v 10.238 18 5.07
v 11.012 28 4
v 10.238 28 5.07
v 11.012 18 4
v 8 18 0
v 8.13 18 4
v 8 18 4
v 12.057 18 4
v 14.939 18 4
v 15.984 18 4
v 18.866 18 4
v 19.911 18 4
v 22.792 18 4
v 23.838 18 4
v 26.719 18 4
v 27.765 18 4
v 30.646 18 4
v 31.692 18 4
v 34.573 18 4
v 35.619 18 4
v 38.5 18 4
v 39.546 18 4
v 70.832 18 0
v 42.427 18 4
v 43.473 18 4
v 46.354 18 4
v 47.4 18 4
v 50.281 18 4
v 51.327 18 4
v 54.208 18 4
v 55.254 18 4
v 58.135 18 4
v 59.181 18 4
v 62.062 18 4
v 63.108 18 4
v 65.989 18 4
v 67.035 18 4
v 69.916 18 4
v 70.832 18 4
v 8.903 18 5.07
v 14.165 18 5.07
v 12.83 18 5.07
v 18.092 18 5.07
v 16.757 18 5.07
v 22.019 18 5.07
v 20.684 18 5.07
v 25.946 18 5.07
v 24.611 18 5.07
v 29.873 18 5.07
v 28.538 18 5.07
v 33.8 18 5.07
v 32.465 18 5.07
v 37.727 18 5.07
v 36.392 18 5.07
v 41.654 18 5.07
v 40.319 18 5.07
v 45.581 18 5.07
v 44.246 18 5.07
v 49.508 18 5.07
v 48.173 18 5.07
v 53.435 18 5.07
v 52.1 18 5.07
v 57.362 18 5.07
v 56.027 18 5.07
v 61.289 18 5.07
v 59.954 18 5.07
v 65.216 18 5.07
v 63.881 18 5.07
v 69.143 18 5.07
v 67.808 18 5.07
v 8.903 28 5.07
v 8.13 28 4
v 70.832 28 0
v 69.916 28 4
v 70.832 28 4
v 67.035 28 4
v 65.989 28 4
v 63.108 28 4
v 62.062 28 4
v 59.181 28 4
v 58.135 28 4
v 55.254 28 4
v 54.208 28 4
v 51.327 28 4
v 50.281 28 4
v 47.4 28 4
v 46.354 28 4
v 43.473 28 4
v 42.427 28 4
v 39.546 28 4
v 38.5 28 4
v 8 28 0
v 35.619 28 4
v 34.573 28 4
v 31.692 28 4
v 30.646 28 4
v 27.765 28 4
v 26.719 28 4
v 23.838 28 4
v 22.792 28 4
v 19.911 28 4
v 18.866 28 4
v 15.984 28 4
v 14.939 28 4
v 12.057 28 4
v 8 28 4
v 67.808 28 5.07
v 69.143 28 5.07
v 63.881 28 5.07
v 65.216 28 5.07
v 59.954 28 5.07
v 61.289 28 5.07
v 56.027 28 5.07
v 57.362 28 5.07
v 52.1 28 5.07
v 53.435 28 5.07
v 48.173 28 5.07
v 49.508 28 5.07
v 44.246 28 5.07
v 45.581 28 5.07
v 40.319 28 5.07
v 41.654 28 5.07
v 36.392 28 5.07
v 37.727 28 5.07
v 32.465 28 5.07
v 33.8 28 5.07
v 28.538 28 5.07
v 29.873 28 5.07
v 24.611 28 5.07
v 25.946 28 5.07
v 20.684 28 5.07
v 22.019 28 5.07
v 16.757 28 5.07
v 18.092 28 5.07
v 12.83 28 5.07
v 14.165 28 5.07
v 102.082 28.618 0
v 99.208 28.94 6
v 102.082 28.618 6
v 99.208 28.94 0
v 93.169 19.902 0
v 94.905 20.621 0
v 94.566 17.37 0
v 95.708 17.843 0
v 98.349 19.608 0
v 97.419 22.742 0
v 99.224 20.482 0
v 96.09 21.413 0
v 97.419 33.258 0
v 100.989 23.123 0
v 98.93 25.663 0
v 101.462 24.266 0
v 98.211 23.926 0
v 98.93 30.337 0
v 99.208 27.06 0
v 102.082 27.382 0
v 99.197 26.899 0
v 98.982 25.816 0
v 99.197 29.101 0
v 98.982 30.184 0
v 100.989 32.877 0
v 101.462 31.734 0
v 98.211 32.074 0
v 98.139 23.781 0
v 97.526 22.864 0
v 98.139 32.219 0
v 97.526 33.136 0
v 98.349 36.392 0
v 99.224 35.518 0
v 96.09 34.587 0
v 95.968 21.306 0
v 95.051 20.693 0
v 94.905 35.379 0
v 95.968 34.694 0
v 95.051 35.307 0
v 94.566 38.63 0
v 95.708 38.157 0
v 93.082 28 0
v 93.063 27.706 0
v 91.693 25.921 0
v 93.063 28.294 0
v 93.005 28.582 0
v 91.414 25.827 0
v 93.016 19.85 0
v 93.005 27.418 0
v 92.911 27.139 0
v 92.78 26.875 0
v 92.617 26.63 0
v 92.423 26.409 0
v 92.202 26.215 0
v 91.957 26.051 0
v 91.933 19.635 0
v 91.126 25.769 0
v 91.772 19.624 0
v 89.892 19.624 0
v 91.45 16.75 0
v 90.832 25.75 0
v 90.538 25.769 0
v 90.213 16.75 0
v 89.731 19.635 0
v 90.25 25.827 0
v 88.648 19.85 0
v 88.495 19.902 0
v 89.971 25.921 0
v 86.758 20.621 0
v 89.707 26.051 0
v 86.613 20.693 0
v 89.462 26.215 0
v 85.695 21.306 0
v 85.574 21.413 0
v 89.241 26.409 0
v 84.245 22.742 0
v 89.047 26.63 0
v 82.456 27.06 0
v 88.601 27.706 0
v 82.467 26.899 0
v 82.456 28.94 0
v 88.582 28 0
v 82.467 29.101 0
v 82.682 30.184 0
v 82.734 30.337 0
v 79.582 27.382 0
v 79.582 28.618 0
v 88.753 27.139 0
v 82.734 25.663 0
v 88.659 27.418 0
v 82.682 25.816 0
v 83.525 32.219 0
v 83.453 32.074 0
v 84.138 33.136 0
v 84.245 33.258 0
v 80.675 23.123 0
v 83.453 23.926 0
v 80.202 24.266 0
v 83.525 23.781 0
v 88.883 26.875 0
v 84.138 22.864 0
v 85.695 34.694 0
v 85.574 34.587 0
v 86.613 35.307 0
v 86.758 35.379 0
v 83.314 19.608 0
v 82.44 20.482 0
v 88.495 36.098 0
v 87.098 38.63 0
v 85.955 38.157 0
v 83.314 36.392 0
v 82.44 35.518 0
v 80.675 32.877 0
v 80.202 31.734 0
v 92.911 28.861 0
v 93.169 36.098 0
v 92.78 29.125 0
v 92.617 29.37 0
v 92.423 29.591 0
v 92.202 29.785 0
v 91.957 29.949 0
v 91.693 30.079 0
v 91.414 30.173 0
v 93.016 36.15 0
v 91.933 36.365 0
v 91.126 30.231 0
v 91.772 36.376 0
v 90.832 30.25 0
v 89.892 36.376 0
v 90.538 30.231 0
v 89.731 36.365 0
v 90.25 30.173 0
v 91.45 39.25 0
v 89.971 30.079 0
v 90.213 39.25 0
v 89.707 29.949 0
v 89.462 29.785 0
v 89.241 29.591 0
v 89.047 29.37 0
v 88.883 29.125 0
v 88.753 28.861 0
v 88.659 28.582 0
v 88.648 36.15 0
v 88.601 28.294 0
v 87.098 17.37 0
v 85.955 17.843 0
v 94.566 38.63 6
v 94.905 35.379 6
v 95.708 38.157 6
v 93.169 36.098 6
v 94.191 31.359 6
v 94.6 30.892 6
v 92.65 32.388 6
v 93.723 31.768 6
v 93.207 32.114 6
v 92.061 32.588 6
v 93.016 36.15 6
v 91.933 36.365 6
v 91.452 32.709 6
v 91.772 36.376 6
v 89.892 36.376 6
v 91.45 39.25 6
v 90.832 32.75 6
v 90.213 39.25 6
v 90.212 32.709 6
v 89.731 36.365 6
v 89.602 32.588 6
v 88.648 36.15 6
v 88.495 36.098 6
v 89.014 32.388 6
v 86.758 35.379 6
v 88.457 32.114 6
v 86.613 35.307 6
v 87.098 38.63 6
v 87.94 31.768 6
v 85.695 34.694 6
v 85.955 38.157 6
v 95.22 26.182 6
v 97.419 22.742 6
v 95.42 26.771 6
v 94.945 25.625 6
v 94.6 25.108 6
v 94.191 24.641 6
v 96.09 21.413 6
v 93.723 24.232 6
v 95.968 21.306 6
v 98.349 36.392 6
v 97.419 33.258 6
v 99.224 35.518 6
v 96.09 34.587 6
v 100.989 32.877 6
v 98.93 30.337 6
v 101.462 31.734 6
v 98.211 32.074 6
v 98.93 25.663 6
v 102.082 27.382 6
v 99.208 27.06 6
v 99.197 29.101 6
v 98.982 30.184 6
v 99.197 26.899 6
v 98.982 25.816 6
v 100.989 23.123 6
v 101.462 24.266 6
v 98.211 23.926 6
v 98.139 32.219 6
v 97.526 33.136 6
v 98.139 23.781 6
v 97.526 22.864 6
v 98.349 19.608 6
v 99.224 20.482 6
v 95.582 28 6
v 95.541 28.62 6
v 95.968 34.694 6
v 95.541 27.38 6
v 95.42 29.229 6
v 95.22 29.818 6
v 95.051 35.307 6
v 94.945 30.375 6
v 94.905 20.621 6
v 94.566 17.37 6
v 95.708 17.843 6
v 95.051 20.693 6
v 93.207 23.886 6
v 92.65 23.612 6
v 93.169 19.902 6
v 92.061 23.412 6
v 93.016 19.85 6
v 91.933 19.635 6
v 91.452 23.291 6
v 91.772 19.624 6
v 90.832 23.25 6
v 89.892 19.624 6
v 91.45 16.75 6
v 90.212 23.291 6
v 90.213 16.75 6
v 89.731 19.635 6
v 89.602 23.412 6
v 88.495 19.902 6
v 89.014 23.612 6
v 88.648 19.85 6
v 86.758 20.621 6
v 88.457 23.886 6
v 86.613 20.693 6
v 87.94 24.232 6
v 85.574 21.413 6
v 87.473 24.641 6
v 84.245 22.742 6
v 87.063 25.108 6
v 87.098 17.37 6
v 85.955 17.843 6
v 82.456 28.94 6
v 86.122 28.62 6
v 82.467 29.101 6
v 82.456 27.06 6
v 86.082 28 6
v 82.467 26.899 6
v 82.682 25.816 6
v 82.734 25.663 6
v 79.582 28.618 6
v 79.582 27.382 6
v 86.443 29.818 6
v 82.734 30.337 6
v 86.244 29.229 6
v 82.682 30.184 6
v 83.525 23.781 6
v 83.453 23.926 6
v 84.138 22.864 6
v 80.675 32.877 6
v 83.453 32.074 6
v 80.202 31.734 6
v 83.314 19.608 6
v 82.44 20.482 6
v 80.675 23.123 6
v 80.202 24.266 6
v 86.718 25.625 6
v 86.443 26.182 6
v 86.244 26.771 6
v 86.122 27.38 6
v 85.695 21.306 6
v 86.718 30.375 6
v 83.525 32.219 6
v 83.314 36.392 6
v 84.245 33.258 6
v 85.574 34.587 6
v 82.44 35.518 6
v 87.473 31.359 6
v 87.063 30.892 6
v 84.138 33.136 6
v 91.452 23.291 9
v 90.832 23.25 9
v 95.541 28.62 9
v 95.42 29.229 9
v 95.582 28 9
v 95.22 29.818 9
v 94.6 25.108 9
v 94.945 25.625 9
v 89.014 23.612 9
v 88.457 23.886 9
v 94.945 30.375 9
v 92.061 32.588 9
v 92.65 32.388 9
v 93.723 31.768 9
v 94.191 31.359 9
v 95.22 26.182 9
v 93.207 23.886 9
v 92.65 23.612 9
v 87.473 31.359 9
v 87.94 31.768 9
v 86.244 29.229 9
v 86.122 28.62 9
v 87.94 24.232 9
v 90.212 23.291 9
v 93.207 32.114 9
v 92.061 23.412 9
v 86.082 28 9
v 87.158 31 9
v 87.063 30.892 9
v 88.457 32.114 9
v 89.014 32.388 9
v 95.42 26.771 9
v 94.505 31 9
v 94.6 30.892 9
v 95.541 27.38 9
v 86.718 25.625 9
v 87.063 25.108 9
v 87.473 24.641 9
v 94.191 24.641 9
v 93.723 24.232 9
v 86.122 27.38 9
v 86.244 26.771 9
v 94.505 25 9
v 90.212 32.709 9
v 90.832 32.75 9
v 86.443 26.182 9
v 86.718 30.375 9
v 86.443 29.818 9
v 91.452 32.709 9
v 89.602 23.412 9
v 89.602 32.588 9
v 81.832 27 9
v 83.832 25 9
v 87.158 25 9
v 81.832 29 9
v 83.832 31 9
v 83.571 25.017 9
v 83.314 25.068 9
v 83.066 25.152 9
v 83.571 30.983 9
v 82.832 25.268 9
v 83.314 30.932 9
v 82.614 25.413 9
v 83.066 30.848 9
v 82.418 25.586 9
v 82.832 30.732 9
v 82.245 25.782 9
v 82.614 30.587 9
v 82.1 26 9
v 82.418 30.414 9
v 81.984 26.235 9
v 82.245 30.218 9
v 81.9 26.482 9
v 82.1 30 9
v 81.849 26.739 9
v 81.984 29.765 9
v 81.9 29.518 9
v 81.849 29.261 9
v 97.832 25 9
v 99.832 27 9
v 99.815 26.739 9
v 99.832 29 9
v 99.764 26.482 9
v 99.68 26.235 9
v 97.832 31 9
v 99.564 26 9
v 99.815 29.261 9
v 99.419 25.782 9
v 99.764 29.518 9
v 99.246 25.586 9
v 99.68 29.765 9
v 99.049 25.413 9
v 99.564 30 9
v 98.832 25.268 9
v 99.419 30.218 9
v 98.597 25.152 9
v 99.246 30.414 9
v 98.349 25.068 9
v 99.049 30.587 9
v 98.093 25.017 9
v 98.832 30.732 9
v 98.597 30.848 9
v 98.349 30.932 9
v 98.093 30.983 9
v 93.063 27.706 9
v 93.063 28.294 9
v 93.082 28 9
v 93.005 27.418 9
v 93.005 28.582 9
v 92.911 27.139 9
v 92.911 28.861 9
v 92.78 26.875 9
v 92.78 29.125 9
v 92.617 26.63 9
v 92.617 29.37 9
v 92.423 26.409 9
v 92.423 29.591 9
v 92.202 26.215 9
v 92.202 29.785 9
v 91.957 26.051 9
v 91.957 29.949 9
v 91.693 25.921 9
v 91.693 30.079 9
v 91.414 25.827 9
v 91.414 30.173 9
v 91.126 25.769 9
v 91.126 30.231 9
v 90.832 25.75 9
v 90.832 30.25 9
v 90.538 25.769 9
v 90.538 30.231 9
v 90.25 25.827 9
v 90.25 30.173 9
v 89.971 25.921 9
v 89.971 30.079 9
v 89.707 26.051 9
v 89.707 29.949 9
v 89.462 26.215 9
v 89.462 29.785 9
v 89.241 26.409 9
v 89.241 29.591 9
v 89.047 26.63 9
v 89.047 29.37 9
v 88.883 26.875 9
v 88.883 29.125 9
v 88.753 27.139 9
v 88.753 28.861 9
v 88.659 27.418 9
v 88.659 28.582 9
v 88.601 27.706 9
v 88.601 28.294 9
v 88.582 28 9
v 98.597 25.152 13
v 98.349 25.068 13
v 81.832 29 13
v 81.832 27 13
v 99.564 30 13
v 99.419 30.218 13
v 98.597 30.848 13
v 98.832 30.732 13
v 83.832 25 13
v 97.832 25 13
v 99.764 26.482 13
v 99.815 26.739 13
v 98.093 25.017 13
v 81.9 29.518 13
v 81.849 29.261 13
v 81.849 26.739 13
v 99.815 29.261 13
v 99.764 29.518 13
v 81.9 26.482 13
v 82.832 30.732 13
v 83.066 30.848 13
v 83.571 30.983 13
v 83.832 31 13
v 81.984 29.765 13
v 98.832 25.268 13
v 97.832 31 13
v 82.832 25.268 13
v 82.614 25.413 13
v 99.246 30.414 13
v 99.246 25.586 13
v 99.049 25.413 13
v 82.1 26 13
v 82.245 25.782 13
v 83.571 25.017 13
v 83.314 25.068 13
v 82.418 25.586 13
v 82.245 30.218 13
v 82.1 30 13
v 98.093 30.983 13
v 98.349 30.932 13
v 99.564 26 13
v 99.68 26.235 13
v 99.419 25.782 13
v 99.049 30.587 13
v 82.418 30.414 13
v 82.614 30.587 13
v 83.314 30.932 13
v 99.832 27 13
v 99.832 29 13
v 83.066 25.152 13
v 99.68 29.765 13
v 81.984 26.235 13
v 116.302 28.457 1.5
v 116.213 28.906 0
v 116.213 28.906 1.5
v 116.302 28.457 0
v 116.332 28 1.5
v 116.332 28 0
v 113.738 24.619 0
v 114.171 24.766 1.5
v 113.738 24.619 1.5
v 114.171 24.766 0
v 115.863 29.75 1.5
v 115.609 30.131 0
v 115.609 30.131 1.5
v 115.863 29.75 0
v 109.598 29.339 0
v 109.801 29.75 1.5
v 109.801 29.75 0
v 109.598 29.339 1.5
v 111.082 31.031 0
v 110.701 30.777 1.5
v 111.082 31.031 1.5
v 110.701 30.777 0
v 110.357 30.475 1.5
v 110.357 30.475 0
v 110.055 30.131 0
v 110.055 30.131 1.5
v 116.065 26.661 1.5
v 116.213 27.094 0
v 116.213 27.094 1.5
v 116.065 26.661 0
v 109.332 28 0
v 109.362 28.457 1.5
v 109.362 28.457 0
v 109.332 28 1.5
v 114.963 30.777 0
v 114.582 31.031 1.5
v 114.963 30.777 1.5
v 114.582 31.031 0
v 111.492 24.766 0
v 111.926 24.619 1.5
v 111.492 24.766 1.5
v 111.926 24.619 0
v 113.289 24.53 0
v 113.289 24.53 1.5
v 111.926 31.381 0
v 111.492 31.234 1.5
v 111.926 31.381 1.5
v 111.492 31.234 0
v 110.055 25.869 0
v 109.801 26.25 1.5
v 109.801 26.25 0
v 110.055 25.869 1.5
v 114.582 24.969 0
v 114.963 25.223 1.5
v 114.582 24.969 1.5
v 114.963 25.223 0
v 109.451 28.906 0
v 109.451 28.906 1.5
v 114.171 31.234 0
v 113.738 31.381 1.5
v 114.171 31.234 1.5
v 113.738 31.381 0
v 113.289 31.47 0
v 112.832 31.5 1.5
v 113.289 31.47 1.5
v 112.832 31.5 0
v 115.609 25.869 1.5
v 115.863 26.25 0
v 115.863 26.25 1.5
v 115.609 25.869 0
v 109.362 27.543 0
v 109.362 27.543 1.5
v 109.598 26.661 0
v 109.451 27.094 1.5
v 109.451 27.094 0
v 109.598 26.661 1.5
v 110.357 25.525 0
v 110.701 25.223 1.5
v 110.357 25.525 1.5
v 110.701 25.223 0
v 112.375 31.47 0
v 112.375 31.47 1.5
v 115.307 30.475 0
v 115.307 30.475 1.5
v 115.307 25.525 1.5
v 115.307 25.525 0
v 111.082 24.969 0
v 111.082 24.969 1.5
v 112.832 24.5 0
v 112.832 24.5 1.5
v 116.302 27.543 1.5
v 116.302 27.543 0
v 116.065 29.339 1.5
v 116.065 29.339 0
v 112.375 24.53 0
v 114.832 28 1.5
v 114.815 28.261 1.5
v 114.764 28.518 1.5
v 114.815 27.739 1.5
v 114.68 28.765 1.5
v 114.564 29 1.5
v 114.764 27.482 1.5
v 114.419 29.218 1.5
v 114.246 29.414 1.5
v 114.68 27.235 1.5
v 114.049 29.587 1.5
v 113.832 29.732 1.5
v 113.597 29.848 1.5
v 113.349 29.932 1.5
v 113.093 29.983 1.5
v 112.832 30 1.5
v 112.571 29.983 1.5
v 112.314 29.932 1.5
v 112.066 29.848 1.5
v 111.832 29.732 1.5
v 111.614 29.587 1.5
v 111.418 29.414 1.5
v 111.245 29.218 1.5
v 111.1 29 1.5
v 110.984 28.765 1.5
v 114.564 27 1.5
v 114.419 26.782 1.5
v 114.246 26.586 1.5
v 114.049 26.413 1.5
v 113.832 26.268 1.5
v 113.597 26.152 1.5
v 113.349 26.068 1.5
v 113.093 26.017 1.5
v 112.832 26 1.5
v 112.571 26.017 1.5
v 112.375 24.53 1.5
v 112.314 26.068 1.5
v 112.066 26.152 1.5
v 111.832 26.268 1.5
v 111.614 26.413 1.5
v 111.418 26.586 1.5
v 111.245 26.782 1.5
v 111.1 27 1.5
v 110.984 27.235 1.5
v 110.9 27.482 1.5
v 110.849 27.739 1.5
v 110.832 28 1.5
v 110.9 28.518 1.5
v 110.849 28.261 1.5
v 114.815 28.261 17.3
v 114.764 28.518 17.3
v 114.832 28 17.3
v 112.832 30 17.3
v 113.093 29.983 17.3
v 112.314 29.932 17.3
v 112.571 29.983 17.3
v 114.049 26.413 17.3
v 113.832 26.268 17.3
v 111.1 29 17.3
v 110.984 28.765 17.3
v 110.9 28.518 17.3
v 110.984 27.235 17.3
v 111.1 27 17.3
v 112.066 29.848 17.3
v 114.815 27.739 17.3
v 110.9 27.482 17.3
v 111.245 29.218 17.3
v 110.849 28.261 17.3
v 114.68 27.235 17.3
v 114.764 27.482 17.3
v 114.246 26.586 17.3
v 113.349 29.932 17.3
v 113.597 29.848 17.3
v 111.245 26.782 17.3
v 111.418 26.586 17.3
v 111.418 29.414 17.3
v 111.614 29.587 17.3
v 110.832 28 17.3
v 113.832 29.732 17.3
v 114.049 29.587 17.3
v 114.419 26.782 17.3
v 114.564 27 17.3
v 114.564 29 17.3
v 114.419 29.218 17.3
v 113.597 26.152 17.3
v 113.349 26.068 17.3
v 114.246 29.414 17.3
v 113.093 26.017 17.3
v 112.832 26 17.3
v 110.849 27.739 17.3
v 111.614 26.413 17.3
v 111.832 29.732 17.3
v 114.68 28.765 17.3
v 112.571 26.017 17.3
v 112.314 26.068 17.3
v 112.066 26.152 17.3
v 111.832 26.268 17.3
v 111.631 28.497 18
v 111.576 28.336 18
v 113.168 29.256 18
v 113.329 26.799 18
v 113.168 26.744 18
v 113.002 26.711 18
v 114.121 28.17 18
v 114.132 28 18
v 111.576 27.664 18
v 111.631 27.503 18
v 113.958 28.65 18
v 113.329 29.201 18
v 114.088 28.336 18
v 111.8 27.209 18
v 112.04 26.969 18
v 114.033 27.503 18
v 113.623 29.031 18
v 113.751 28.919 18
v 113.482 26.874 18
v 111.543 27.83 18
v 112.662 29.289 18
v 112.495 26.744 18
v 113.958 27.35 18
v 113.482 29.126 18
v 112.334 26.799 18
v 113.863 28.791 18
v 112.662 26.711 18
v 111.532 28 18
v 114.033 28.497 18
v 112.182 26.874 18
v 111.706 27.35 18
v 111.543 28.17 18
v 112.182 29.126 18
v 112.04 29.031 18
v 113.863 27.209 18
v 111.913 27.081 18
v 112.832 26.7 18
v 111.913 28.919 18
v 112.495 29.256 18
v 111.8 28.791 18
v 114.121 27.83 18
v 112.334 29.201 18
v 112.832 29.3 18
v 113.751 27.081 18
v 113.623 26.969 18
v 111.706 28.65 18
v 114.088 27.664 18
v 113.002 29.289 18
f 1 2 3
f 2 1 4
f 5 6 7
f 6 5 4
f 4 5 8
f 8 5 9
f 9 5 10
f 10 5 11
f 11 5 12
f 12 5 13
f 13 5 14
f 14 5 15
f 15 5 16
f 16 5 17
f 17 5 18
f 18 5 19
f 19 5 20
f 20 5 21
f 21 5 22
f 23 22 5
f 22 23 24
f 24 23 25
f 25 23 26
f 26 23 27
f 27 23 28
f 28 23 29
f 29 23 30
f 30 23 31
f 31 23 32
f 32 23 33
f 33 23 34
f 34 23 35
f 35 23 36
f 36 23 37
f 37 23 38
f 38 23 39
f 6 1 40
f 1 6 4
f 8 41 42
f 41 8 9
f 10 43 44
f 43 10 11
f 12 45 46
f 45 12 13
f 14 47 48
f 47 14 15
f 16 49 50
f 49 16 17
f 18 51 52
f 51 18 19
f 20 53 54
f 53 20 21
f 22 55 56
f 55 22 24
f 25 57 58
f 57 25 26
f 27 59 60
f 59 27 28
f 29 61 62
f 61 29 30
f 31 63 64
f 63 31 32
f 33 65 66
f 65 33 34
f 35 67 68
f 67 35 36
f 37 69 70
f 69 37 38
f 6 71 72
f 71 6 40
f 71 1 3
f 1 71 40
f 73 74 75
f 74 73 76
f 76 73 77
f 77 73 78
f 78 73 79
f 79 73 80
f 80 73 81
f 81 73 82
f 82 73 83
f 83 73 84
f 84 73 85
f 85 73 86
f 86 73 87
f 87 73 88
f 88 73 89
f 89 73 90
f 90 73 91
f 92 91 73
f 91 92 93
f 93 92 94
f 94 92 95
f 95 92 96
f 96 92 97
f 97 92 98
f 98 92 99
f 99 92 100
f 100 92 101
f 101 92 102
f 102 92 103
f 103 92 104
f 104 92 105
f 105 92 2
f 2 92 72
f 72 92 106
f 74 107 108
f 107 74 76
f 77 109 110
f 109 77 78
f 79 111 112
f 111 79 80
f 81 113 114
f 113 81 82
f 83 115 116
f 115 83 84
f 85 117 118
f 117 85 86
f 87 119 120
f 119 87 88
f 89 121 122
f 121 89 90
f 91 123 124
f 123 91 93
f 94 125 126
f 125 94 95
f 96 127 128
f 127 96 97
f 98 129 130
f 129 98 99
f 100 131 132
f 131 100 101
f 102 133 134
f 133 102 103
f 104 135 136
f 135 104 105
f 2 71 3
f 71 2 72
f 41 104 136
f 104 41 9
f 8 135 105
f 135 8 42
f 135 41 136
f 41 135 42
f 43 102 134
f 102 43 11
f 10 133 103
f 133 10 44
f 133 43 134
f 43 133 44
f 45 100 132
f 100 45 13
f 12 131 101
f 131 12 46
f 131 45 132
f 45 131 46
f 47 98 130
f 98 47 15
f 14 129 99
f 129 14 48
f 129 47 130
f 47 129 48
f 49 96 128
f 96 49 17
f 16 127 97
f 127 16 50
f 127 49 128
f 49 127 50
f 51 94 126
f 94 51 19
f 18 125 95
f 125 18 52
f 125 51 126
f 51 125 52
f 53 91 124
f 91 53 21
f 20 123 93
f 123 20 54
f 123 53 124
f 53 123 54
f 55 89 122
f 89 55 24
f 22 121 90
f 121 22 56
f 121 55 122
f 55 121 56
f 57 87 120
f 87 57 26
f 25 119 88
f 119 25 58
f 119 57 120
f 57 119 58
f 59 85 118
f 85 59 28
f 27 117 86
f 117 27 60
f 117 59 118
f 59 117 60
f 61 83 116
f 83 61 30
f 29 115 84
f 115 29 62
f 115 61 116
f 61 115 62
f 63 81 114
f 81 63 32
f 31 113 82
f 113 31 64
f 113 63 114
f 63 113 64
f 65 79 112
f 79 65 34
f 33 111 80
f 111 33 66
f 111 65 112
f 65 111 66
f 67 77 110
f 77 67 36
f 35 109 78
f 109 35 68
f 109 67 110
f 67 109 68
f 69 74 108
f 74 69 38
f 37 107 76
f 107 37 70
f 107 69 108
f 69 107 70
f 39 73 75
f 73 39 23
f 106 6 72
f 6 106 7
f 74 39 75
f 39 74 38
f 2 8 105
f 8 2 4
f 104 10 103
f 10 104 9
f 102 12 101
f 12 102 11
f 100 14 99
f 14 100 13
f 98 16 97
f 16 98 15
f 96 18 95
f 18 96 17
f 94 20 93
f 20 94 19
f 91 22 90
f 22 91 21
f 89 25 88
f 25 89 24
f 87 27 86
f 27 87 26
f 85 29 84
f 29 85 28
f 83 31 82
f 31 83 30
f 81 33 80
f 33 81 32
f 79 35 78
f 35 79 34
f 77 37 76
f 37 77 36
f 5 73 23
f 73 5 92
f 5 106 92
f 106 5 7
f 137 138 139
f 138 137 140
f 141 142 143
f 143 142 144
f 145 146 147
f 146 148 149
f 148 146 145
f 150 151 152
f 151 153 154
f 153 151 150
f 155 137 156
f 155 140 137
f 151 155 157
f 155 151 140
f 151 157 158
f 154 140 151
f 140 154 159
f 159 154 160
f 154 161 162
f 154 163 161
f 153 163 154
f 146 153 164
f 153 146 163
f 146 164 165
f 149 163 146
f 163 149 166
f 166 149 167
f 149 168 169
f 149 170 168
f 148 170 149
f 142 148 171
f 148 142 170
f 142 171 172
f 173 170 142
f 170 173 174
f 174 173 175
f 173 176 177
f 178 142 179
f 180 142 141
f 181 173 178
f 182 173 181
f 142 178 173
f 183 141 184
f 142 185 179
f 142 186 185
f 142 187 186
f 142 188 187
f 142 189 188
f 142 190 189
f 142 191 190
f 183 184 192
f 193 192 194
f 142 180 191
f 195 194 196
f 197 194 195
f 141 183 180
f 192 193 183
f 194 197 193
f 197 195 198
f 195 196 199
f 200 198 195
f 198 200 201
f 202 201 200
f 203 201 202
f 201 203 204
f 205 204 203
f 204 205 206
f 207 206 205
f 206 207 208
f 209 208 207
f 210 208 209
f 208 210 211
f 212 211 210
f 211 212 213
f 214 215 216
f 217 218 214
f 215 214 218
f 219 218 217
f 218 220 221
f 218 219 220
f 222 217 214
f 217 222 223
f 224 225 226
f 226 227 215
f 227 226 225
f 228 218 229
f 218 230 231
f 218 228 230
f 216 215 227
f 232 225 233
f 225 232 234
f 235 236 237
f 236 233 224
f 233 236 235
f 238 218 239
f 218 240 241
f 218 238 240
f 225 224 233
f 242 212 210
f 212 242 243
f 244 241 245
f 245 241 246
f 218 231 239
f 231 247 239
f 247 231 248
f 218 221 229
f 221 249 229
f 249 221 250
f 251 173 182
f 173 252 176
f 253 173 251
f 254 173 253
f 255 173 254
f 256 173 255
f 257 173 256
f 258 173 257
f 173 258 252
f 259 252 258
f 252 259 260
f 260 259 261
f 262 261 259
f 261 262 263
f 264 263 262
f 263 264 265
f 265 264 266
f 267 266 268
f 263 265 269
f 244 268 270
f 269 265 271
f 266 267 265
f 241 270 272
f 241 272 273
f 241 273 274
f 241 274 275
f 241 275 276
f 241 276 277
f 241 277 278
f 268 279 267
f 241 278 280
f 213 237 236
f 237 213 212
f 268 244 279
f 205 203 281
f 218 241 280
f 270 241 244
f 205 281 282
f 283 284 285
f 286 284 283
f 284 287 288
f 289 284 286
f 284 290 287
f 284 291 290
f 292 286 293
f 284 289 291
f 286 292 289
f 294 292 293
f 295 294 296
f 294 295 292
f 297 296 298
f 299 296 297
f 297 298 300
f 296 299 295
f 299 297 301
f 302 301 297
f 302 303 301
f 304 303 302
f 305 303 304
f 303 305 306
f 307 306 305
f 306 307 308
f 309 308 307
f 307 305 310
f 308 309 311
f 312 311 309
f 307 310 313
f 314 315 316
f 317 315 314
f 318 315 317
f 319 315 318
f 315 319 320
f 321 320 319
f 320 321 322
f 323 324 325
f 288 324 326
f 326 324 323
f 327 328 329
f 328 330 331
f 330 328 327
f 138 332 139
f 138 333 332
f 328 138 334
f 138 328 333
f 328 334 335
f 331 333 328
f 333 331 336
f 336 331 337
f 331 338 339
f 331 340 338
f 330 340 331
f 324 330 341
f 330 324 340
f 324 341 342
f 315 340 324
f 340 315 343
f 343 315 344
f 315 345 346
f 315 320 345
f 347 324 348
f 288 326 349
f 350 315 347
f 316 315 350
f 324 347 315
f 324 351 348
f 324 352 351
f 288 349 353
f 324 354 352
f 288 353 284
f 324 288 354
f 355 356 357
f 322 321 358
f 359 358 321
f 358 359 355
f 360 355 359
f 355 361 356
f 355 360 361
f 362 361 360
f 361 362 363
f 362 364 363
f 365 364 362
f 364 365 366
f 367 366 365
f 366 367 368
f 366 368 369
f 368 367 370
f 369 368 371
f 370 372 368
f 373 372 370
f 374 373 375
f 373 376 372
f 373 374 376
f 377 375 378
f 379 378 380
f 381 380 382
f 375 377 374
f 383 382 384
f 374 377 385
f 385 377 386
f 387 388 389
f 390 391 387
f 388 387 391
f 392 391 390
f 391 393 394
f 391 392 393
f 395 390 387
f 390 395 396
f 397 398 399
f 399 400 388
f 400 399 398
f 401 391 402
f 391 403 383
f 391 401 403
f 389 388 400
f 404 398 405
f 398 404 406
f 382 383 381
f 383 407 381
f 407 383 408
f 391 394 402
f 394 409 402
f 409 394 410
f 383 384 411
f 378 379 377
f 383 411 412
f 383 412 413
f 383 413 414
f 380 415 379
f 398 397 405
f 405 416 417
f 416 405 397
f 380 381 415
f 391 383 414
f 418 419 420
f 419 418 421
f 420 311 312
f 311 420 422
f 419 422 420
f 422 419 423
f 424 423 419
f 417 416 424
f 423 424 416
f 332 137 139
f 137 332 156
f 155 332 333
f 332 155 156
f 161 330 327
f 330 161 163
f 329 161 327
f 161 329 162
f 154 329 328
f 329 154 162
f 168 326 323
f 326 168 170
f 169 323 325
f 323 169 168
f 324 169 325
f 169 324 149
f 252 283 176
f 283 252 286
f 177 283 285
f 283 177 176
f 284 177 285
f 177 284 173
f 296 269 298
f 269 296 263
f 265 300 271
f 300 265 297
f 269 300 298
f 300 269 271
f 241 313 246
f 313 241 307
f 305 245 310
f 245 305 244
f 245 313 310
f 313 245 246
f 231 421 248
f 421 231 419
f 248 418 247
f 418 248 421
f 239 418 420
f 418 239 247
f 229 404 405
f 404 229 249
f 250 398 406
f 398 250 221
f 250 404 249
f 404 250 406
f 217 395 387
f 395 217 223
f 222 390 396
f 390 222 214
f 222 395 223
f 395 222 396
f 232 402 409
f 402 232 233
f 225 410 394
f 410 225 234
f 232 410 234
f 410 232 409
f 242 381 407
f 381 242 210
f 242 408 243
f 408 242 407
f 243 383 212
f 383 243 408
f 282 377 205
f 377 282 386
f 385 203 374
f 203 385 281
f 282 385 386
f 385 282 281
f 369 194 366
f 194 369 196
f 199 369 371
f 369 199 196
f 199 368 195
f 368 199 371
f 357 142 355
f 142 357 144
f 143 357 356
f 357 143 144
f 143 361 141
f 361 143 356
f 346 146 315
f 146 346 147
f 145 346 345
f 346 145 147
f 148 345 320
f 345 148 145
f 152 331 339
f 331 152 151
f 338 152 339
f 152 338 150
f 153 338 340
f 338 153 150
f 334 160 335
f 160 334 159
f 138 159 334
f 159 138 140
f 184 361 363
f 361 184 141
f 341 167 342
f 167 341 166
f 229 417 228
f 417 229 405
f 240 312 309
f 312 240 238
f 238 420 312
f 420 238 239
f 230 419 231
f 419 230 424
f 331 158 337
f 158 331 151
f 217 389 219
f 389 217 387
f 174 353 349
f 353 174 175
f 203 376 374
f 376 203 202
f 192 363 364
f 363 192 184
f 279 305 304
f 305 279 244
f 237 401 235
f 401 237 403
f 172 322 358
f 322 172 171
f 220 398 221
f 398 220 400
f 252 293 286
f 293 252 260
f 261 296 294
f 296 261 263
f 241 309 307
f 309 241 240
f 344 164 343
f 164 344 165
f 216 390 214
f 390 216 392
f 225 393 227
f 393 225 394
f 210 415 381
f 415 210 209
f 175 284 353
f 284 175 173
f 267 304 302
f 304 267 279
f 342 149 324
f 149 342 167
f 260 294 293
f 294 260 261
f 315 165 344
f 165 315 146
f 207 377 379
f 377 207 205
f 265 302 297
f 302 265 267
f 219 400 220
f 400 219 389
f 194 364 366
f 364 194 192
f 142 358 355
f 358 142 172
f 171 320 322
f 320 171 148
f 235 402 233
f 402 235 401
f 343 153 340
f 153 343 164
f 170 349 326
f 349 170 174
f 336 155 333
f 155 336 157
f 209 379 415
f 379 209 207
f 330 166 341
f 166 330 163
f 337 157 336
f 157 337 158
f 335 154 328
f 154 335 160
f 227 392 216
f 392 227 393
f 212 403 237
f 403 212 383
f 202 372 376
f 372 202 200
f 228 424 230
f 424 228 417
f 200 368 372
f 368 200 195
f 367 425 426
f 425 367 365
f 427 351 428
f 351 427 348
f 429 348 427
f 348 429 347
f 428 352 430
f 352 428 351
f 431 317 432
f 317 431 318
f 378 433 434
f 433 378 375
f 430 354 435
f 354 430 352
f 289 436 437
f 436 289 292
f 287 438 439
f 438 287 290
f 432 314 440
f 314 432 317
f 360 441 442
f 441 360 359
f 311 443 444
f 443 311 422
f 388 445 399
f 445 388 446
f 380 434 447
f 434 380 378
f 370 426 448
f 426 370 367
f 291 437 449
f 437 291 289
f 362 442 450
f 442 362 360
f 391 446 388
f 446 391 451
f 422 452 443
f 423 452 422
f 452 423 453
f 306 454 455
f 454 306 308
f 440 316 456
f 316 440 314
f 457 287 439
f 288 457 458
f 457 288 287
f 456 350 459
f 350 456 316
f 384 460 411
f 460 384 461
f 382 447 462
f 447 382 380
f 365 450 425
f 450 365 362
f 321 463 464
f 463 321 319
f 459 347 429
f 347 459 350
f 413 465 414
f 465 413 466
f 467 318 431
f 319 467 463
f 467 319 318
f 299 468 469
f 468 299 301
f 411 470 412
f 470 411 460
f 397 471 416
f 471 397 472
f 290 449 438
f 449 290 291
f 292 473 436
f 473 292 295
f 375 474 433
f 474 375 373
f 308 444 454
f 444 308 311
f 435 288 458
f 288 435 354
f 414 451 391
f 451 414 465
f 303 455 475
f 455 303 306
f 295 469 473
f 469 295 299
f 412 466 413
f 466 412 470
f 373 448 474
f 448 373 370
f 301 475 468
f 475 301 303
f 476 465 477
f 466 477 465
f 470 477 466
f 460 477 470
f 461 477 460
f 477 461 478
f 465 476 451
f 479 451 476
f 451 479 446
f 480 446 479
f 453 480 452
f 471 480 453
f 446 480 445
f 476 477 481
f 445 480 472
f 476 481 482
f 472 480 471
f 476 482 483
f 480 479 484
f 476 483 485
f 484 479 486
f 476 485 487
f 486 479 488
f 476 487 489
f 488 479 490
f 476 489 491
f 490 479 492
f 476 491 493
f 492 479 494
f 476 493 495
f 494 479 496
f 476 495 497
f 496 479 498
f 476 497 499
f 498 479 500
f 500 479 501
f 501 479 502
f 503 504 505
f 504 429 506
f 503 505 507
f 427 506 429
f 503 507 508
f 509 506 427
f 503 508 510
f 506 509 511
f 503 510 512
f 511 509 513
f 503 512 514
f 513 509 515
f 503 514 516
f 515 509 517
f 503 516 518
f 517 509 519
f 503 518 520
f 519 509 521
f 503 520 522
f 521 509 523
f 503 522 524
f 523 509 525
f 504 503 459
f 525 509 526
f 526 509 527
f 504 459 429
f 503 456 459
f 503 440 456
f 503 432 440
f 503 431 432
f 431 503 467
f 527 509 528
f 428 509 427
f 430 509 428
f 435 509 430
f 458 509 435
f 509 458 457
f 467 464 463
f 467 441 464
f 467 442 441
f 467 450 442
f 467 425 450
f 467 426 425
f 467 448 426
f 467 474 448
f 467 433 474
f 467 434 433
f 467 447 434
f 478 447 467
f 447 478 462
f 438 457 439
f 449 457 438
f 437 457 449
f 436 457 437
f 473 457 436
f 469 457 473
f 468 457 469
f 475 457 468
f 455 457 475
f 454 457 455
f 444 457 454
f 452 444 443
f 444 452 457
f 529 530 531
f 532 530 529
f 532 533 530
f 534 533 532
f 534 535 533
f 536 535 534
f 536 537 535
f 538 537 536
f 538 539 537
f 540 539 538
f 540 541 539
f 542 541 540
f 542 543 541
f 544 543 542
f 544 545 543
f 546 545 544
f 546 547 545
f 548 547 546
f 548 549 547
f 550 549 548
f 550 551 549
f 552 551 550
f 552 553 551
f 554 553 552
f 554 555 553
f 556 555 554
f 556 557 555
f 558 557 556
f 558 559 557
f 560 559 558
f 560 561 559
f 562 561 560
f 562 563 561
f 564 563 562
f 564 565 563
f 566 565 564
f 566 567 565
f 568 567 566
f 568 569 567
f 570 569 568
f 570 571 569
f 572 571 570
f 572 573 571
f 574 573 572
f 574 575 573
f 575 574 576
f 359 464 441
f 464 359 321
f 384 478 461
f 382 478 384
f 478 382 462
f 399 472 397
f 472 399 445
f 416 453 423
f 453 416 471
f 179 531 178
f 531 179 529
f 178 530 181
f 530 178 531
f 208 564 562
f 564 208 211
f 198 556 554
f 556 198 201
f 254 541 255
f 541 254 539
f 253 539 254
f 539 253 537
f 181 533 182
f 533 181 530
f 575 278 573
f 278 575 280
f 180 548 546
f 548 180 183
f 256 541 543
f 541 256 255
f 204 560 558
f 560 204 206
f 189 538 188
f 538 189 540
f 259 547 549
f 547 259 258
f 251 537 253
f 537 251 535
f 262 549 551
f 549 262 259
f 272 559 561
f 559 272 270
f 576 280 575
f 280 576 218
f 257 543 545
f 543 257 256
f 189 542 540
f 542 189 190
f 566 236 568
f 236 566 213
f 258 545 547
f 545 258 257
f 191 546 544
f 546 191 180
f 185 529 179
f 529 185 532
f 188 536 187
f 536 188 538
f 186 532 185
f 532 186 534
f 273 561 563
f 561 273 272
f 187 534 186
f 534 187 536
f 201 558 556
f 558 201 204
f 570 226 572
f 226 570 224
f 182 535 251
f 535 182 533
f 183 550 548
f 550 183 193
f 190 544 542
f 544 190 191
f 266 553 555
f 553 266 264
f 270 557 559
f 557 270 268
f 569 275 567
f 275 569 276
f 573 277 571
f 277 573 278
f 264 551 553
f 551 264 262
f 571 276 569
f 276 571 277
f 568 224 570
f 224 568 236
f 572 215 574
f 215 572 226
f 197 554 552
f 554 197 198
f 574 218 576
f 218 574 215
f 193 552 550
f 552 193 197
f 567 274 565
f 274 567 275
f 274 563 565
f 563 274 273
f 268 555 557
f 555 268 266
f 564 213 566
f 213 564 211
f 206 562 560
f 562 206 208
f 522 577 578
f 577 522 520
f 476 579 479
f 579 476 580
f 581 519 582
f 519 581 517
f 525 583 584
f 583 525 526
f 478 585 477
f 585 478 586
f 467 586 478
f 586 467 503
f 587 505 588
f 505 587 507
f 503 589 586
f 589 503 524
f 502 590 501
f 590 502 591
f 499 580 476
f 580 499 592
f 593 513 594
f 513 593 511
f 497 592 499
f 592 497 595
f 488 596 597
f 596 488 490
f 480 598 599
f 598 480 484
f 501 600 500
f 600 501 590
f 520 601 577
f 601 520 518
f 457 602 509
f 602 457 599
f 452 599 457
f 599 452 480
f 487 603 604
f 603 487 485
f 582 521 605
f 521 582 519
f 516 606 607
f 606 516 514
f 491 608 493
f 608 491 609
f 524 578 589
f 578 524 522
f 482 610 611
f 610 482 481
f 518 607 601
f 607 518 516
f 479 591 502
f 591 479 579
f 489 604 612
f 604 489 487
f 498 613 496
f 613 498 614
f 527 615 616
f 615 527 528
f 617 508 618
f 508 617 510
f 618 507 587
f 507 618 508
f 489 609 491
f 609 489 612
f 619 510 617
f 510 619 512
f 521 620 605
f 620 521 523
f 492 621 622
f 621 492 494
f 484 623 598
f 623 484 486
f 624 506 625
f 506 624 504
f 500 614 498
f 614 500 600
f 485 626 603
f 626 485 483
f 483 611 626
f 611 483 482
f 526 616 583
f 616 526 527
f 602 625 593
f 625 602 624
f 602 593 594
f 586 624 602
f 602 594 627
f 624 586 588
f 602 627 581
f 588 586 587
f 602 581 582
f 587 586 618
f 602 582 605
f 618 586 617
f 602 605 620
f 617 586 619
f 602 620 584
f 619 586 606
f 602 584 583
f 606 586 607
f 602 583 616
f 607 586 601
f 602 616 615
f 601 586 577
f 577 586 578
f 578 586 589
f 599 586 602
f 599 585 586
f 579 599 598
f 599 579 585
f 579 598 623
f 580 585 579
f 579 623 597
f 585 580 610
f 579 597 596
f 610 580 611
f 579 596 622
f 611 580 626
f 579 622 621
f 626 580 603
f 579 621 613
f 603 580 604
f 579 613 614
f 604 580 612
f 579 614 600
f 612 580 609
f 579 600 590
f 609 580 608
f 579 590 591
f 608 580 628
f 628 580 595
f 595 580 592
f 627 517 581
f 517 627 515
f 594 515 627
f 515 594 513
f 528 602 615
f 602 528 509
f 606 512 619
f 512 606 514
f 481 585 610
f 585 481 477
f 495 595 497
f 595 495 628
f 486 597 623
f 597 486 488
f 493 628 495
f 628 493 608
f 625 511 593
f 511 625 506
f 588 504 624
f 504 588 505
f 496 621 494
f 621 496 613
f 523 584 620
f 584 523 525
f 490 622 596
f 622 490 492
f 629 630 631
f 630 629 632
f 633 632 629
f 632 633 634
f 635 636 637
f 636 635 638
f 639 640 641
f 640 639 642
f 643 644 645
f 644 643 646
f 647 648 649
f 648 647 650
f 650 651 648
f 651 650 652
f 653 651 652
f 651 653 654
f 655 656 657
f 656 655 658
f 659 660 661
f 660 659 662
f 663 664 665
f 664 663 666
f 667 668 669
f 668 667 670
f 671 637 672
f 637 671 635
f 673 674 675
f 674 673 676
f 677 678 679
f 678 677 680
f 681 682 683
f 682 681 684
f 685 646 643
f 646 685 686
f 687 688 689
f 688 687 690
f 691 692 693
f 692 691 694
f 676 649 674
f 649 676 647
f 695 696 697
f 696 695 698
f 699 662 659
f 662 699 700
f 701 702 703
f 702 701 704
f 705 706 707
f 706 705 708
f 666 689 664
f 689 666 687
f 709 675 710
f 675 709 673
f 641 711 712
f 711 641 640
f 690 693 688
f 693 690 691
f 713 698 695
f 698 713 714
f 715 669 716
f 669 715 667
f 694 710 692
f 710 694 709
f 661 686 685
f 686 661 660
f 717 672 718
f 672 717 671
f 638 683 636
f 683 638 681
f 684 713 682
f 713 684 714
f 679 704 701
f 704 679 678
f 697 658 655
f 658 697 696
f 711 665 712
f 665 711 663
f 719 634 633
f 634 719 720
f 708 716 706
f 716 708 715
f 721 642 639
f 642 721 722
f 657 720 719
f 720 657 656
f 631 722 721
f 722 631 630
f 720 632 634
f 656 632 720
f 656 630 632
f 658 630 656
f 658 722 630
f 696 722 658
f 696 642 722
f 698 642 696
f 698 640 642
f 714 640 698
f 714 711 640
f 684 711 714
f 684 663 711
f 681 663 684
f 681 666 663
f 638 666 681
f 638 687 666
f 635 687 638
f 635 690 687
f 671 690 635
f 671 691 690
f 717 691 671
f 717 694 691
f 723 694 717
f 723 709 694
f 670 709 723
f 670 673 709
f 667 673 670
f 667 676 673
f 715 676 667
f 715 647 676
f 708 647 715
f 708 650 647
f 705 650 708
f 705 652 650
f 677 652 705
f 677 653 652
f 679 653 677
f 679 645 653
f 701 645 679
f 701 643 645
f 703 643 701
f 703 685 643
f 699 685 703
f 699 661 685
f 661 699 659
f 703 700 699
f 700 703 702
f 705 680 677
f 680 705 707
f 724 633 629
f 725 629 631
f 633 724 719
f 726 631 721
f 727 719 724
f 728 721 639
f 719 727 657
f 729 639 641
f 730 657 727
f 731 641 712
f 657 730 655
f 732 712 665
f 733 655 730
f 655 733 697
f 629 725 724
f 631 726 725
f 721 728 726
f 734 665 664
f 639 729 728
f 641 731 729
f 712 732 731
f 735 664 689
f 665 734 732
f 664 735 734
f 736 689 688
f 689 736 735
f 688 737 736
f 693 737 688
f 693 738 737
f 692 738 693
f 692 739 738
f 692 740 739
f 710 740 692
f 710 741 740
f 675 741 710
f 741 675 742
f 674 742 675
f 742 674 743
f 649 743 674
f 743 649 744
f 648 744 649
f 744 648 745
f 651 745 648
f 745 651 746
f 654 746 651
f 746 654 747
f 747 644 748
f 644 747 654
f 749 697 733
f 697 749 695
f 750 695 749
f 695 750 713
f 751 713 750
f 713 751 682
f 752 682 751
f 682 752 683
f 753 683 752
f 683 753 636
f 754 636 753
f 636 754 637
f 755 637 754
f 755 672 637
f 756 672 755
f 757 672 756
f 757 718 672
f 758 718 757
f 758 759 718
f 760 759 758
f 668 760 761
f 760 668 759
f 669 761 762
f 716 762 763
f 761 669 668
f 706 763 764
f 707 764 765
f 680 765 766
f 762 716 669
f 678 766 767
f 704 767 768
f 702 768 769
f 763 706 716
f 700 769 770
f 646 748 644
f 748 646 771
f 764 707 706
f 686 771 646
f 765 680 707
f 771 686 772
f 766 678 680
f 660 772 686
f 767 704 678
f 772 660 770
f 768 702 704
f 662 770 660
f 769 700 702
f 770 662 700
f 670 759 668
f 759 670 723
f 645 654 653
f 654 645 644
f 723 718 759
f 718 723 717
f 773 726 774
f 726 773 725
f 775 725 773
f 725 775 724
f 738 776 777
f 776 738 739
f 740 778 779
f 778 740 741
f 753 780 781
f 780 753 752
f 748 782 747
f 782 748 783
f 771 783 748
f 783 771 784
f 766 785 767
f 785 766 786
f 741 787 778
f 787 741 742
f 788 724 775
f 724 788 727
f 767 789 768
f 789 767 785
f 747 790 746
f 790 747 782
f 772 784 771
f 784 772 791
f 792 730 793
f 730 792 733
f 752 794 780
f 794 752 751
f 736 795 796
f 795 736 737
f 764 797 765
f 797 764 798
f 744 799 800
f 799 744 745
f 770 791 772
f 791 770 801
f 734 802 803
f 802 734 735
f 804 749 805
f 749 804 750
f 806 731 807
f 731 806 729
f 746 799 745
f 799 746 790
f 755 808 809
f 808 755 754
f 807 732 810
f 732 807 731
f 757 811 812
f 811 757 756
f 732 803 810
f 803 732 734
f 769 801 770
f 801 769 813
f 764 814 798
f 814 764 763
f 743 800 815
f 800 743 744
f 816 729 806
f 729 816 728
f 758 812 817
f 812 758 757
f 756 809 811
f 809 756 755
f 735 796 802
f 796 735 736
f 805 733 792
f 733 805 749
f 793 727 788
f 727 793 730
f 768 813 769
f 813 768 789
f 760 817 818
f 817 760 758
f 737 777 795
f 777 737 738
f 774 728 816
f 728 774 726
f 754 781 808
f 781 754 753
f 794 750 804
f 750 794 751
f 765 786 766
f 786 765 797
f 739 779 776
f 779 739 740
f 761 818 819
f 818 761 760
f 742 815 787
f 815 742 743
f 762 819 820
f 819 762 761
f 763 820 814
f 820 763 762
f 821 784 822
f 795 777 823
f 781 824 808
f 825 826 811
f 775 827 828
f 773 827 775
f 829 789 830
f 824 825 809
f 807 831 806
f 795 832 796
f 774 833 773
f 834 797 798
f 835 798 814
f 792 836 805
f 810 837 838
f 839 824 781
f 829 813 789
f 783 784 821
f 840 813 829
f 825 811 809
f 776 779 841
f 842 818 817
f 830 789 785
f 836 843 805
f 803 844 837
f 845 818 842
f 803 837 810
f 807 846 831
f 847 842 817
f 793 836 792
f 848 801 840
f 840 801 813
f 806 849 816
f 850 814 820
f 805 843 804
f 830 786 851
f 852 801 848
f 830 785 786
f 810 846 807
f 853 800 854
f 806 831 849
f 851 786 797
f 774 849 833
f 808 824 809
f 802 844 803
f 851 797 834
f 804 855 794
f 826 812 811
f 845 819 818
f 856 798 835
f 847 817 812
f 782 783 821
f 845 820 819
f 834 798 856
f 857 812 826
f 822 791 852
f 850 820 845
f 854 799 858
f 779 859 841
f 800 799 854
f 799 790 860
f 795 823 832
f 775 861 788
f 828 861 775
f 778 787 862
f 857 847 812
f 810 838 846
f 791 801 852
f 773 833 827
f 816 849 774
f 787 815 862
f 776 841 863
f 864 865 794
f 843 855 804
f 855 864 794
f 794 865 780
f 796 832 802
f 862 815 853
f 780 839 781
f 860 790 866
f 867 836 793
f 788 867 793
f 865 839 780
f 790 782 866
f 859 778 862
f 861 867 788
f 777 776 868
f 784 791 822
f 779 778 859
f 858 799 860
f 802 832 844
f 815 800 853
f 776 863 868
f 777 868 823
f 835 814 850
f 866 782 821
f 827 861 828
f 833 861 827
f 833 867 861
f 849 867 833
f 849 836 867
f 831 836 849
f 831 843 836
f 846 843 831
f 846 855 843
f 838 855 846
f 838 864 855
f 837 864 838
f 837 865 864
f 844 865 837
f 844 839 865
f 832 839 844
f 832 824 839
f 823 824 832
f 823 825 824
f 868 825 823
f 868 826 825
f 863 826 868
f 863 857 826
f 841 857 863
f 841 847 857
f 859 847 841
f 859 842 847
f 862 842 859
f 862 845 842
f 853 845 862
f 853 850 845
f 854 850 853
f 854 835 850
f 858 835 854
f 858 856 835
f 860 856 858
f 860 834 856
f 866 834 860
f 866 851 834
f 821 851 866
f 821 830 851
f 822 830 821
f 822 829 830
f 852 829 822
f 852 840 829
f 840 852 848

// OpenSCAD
/*
Sample 097: Zahnstange und Ritzel — Modul 1,25
Generated from the FDM Mechanical Sample Library.
Units: millimetres.

Override examples:
  openscad -o custom.stl -D 'view="plate"' -D 'render_fn=64' model.scad
  openscad -o preview.png -D 'view="assembly"' model.scad
*/
use <../../../library/fdm_mechanisms.scad>

render_fn = is_undef(render_fn) ? 48 : render_fn;
view = is_undef(view) ? "plate" : view;
$fn = render_fn;

sample_rack_pinion(
    view=view,
    teeth=16,
    module_size=1.25,
    clearance=0.25
);
